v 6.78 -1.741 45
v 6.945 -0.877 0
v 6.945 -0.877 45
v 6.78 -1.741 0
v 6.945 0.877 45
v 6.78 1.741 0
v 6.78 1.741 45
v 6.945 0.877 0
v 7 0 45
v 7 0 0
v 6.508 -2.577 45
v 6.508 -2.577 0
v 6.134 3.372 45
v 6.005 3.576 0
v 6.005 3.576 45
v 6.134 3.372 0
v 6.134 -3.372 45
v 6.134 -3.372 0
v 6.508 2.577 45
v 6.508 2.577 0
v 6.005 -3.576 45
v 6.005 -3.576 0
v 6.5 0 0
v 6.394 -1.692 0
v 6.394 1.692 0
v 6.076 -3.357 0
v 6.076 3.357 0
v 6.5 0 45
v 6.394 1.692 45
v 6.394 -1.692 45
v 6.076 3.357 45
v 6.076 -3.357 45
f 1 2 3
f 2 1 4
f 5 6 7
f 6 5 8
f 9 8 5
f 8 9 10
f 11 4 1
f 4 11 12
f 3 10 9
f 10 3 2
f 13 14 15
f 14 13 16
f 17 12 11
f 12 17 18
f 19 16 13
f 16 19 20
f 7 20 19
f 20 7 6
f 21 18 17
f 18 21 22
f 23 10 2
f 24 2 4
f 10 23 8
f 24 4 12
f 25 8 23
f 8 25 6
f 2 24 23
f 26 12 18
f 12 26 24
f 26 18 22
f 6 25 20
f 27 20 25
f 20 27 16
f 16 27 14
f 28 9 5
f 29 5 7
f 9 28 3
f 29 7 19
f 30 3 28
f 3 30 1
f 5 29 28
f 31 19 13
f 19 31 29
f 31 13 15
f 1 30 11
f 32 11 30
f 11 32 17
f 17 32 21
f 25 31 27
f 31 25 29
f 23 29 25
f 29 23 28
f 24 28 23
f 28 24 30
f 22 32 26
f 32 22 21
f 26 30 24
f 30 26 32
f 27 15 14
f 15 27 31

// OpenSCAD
$fn = 50;


difference() {
	union() {
		cylinder(h = 45, r = 7.0000000000);
		translate(v = [-10.0000000000, 0, 0]) {
			cylinder(h = 45, r = 7.0000000000);
		}
	}
	union() {
		cylinder(h = 45, r = 3.2500000000);
		cylinder(h = 45, r = 1.8000000000);
		cylinder(h = 45, r = 1.8000000000);
		cylinder(h = 45, r = 1.8000000000);
		translate(v = [-14.5000000000, 0, 0]) {
			hull() {
				translate(v = [-3.7500000000, 0.0000000000, 0]) {
					cylinder(h = 45, r = 7.5000000000);
				}
				translate(v = [3.7500000000, 0.0000000000, 0]) {
					cylinder(h = 45, r = 7.5000000000);
				}
				translate(v = [-3.7500000000, -0.0000000000, 0]) {
					cylinder(h = 45, r = 7.5000000000);
				}
				translate(v = [3.7500000000, -0.0000000000, 0]) {
					cylinder(h = 45, r = 7.5000000000);
				}
			}
		}
		translate(v = [-7.0000000000, 0, 0.0000000000]) {
			cylinder(h = 45, r = 13.5000000000);
		}
	}
}
